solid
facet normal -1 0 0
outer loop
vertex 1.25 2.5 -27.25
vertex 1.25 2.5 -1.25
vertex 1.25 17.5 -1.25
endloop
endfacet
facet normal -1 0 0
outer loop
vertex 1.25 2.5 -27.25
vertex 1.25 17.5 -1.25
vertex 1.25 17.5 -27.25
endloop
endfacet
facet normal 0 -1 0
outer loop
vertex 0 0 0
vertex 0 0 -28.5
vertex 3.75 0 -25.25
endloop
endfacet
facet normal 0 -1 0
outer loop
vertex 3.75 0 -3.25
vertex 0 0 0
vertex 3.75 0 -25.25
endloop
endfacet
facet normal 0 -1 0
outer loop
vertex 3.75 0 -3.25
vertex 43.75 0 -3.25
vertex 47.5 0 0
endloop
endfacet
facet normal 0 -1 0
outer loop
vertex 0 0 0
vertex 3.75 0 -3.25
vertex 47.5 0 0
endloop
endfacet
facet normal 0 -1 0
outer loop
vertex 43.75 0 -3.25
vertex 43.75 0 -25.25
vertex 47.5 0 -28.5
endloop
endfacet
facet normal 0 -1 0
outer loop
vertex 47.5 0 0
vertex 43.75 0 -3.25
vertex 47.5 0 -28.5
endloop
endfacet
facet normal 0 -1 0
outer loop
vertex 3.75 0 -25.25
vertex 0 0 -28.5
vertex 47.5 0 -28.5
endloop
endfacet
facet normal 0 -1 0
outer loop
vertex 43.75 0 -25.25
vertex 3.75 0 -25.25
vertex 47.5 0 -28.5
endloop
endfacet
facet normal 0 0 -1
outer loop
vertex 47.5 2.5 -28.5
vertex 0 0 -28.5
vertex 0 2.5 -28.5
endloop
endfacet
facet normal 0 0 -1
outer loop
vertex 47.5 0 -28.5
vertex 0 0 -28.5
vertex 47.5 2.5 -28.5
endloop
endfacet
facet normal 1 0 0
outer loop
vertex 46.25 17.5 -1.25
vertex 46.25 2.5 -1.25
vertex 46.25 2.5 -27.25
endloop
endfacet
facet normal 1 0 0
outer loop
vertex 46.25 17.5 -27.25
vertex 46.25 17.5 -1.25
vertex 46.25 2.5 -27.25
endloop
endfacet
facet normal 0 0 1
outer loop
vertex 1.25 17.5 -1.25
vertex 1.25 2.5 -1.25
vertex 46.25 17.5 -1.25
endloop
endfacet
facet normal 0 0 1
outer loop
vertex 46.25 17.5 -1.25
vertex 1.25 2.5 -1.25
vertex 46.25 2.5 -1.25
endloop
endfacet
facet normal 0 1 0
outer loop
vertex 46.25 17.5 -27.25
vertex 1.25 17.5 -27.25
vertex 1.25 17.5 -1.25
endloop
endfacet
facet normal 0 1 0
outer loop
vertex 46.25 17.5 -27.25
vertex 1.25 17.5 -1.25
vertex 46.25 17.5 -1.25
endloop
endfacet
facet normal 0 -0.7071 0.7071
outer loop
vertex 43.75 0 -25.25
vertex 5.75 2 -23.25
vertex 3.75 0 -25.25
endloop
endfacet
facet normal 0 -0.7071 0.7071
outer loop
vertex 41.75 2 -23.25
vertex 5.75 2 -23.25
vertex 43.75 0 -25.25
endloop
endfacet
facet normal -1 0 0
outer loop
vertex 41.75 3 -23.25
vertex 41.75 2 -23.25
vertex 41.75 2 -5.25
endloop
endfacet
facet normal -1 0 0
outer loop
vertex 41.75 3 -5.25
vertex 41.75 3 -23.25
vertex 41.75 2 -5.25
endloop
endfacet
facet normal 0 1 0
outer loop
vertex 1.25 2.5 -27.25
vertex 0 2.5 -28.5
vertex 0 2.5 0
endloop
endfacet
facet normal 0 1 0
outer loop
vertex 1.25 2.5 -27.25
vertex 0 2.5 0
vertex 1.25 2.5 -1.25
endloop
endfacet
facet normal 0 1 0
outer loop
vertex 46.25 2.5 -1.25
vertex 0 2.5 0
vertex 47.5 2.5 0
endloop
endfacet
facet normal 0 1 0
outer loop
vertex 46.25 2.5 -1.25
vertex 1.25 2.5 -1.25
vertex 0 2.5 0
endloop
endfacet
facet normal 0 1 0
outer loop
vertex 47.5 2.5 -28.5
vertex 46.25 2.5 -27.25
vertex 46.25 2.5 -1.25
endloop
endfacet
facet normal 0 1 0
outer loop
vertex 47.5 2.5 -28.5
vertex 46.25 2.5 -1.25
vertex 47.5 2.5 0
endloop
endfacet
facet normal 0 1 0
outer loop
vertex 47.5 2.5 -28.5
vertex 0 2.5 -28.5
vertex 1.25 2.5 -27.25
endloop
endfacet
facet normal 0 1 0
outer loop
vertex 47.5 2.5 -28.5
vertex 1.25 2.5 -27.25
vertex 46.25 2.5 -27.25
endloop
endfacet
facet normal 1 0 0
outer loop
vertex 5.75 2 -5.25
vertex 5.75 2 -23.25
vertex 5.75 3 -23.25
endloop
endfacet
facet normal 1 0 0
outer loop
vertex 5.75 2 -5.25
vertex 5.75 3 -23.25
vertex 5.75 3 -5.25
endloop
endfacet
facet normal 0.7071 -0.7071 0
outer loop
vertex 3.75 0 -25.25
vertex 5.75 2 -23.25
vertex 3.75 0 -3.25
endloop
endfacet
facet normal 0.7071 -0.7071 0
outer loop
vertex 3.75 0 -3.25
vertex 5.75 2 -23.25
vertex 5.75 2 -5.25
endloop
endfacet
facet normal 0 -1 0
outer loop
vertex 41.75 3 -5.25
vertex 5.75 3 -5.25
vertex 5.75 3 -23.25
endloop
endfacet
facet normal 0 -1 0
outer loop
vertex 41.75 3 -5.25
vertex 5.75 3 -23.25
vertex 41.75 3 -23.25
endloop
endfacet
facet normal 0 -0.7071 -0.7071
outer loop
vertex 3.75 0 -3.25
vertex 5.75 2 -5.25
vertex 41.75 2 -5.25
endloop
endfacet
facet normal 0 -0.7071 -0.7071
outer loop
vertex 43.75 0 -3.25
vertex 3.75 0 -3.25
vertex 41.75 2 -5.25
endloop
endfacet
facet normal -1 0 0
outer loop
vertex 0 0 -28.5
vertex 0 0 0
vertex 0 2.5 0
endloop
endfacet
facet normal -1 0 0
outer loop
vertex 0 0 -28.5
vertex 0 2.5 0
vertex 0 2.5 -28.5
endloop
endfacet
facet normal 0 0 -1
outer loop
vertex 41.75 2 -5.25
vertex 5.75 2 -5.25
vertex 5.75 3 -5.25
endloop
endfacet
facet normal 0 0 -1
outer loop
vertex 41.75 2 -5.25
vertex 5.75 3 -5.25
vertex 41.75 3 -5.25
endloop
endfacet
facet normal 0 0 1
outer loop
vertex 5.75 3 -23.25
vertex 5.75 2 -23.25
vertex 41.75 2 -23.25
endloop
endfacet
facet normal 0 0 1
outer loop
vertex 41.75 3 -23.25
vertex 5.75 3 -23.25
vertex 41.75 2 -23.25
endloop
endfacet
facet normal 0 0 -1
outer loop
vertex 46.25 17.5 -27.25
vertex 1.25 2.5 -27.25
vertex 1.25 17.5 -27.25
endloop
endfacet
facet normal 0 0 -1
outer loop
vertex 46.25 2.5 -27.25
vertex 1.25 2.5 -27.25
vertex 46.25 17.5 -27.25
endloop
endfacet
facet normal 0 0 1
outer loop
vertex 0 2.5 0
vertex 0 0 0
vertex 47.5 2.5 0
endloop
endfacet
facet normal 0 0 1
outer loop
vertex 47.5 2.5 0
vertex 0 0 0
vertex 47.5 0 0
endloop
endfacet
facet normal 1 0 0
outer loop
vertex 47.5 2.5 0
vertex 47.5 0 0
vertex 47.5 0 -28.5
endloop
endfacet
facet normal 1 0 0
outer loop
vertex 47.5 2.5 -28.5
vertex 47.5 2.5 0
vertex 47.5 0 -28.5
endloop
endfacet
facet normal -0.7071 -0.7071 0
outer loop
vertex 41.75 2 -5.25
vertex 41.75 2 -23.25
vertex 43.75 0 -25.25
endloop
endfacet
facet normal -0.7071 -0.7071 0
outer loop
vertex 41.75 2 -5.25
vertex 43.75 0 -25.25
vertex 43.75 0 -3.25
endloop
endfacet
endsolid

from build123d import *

# Parameters (mm, degrees)
SKETCH_1_W          = 47.5
SKETCH_1_H          = 28.5
EXTRUDE_1_DEPTH     = 2.5
SKETCH_2_W          = 45
SKETCH_2_H          = 26
EXTRUDE_2_DEPTH     = 15
SKETCH_3_W          = 36
SKETCH_3_H          = 18
CUT_EXTRUDE_1_DEPTH = 3
CHAMFER_1_SIZE      = 2


with BuildPart() as part:
    # 草图1 → 凸台-拉伸1 (new body)
    with BuildSketch(Plane(origin=(0, 0, 0), x_dir=(1, 0, 0), z_dir=(0, 1, 0))):
        with Locations((23.75, 14.25)):
            Rectangle(SKETCH_1_W, SKETCH_1_H)
    extrude(amount=EXTRUDE_1_DEPTH)

    # 草图2 → 凸台-拉伸2 (add)
    with BuildSketch(Plane(origin=(0, 2.5, 0), x_dir=(1, 0, 0), z_dir=(0, 1, 0))):
        with Locations((23.75, 14.25)):
            Rectangle(SKETCH_2_W, SKETCH_2_H)
    extrude(amount=EXTRUDE_2_DEPTH)

    # 草图3 → 切除-拉伸1 (cut)
    with BuildSketch(Plane.XZ):
        with Locations((23.75, -14.25)):
            Rectangle(SKETCH_3_W, SKETCH_3_H)
    extrude(amount=-CUT_EXTRUDE_1_DEPTH, mode=Mode.SUBTRACT)

    # 倒角1
    chamfer_1_edges = [part.edges().sort_by_distance(p)[0] for p in [
        (41.75, 0, -14.25),
        (23.75, 0, -5.25),
        (5.75, 0, -14.25),
        (23.75, 0, -23.25),
    ]]
    chamfer(chamfer_1_edges, length=CHAMFER_1_SIZE)


solid = part.part
